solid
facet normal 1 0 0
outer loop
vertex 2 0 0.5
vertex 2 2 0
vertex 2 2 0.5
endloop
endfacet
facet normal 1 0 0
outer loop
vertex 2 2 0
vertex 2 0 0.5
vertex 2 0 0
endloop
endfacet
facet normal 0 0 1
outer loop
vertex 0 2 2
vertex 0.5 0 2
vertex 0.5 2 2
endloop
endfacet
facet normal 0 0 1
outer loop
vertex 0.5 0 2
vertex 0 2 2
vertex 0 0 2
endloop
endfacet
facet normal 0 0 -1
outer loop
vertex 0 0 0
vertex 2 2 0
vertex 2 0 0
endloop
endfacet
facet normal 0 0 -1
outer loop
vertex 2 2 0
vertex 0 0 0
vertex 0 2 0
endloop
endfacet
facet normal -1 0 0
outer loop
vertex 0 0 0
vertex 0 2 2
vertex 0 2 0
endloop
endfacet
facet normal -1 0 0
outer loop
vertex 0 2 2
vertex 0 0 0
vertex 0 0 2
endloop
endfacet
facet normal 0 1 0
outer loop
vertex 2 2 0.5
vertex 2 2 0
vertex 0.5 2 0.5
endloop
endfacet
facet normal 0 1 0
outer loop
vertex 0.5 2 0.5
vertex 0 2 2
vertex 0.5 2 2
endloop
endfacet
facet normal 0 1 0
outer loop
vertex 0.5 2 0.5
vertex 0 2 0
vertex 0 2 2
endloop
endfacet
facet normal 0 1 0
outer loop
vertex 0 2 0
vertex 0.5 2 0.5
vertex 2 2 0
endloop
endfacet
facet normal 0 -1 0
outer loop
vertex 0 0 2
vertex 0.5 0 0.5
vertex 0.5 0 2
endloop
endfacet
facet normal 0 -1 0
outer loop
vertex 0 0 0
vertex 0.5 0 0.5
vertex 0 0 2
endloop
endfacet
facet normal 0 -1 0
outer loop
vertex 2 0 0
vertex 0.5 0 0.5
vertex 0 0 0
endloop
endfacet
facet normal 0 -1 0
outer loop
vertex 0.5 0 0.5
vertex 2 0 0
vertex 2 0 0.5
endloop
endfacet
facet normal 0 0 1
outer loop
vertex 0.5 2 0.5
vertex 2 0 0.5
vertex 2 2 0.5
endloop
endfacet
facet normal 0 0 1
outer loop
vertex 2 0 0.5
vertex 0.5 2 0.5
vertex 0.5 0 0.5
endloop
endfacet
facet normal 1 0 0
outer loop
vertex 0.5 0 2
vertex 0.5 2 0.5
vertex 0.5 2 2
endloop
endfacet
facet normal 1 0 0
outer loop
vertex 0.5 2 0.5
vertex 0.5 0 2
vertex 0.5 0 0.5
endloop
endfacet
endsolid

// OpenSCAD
difference() {
  translate([1.0000000000, 1.0000000000, 1.0000000000]) {
    scale([2.0000000000, 2.0000000000, 2.0000000000]) {
      translate([-0.5000000000, -0.5000000000, -0.5000000000]) {
        cube([1, 1, 1]);
      }
    }
  }
  translate([1.2500000000, 1.0000000000, 1.2500000000]) {
    scale([1.5000000000, 2.0000000000, 1.5000000000]) {
      translate([-0.5000000000, -0.5000000000, -0.5000000000]) {
        cube([1, 1, 1]);
      }
    }
  }
}
